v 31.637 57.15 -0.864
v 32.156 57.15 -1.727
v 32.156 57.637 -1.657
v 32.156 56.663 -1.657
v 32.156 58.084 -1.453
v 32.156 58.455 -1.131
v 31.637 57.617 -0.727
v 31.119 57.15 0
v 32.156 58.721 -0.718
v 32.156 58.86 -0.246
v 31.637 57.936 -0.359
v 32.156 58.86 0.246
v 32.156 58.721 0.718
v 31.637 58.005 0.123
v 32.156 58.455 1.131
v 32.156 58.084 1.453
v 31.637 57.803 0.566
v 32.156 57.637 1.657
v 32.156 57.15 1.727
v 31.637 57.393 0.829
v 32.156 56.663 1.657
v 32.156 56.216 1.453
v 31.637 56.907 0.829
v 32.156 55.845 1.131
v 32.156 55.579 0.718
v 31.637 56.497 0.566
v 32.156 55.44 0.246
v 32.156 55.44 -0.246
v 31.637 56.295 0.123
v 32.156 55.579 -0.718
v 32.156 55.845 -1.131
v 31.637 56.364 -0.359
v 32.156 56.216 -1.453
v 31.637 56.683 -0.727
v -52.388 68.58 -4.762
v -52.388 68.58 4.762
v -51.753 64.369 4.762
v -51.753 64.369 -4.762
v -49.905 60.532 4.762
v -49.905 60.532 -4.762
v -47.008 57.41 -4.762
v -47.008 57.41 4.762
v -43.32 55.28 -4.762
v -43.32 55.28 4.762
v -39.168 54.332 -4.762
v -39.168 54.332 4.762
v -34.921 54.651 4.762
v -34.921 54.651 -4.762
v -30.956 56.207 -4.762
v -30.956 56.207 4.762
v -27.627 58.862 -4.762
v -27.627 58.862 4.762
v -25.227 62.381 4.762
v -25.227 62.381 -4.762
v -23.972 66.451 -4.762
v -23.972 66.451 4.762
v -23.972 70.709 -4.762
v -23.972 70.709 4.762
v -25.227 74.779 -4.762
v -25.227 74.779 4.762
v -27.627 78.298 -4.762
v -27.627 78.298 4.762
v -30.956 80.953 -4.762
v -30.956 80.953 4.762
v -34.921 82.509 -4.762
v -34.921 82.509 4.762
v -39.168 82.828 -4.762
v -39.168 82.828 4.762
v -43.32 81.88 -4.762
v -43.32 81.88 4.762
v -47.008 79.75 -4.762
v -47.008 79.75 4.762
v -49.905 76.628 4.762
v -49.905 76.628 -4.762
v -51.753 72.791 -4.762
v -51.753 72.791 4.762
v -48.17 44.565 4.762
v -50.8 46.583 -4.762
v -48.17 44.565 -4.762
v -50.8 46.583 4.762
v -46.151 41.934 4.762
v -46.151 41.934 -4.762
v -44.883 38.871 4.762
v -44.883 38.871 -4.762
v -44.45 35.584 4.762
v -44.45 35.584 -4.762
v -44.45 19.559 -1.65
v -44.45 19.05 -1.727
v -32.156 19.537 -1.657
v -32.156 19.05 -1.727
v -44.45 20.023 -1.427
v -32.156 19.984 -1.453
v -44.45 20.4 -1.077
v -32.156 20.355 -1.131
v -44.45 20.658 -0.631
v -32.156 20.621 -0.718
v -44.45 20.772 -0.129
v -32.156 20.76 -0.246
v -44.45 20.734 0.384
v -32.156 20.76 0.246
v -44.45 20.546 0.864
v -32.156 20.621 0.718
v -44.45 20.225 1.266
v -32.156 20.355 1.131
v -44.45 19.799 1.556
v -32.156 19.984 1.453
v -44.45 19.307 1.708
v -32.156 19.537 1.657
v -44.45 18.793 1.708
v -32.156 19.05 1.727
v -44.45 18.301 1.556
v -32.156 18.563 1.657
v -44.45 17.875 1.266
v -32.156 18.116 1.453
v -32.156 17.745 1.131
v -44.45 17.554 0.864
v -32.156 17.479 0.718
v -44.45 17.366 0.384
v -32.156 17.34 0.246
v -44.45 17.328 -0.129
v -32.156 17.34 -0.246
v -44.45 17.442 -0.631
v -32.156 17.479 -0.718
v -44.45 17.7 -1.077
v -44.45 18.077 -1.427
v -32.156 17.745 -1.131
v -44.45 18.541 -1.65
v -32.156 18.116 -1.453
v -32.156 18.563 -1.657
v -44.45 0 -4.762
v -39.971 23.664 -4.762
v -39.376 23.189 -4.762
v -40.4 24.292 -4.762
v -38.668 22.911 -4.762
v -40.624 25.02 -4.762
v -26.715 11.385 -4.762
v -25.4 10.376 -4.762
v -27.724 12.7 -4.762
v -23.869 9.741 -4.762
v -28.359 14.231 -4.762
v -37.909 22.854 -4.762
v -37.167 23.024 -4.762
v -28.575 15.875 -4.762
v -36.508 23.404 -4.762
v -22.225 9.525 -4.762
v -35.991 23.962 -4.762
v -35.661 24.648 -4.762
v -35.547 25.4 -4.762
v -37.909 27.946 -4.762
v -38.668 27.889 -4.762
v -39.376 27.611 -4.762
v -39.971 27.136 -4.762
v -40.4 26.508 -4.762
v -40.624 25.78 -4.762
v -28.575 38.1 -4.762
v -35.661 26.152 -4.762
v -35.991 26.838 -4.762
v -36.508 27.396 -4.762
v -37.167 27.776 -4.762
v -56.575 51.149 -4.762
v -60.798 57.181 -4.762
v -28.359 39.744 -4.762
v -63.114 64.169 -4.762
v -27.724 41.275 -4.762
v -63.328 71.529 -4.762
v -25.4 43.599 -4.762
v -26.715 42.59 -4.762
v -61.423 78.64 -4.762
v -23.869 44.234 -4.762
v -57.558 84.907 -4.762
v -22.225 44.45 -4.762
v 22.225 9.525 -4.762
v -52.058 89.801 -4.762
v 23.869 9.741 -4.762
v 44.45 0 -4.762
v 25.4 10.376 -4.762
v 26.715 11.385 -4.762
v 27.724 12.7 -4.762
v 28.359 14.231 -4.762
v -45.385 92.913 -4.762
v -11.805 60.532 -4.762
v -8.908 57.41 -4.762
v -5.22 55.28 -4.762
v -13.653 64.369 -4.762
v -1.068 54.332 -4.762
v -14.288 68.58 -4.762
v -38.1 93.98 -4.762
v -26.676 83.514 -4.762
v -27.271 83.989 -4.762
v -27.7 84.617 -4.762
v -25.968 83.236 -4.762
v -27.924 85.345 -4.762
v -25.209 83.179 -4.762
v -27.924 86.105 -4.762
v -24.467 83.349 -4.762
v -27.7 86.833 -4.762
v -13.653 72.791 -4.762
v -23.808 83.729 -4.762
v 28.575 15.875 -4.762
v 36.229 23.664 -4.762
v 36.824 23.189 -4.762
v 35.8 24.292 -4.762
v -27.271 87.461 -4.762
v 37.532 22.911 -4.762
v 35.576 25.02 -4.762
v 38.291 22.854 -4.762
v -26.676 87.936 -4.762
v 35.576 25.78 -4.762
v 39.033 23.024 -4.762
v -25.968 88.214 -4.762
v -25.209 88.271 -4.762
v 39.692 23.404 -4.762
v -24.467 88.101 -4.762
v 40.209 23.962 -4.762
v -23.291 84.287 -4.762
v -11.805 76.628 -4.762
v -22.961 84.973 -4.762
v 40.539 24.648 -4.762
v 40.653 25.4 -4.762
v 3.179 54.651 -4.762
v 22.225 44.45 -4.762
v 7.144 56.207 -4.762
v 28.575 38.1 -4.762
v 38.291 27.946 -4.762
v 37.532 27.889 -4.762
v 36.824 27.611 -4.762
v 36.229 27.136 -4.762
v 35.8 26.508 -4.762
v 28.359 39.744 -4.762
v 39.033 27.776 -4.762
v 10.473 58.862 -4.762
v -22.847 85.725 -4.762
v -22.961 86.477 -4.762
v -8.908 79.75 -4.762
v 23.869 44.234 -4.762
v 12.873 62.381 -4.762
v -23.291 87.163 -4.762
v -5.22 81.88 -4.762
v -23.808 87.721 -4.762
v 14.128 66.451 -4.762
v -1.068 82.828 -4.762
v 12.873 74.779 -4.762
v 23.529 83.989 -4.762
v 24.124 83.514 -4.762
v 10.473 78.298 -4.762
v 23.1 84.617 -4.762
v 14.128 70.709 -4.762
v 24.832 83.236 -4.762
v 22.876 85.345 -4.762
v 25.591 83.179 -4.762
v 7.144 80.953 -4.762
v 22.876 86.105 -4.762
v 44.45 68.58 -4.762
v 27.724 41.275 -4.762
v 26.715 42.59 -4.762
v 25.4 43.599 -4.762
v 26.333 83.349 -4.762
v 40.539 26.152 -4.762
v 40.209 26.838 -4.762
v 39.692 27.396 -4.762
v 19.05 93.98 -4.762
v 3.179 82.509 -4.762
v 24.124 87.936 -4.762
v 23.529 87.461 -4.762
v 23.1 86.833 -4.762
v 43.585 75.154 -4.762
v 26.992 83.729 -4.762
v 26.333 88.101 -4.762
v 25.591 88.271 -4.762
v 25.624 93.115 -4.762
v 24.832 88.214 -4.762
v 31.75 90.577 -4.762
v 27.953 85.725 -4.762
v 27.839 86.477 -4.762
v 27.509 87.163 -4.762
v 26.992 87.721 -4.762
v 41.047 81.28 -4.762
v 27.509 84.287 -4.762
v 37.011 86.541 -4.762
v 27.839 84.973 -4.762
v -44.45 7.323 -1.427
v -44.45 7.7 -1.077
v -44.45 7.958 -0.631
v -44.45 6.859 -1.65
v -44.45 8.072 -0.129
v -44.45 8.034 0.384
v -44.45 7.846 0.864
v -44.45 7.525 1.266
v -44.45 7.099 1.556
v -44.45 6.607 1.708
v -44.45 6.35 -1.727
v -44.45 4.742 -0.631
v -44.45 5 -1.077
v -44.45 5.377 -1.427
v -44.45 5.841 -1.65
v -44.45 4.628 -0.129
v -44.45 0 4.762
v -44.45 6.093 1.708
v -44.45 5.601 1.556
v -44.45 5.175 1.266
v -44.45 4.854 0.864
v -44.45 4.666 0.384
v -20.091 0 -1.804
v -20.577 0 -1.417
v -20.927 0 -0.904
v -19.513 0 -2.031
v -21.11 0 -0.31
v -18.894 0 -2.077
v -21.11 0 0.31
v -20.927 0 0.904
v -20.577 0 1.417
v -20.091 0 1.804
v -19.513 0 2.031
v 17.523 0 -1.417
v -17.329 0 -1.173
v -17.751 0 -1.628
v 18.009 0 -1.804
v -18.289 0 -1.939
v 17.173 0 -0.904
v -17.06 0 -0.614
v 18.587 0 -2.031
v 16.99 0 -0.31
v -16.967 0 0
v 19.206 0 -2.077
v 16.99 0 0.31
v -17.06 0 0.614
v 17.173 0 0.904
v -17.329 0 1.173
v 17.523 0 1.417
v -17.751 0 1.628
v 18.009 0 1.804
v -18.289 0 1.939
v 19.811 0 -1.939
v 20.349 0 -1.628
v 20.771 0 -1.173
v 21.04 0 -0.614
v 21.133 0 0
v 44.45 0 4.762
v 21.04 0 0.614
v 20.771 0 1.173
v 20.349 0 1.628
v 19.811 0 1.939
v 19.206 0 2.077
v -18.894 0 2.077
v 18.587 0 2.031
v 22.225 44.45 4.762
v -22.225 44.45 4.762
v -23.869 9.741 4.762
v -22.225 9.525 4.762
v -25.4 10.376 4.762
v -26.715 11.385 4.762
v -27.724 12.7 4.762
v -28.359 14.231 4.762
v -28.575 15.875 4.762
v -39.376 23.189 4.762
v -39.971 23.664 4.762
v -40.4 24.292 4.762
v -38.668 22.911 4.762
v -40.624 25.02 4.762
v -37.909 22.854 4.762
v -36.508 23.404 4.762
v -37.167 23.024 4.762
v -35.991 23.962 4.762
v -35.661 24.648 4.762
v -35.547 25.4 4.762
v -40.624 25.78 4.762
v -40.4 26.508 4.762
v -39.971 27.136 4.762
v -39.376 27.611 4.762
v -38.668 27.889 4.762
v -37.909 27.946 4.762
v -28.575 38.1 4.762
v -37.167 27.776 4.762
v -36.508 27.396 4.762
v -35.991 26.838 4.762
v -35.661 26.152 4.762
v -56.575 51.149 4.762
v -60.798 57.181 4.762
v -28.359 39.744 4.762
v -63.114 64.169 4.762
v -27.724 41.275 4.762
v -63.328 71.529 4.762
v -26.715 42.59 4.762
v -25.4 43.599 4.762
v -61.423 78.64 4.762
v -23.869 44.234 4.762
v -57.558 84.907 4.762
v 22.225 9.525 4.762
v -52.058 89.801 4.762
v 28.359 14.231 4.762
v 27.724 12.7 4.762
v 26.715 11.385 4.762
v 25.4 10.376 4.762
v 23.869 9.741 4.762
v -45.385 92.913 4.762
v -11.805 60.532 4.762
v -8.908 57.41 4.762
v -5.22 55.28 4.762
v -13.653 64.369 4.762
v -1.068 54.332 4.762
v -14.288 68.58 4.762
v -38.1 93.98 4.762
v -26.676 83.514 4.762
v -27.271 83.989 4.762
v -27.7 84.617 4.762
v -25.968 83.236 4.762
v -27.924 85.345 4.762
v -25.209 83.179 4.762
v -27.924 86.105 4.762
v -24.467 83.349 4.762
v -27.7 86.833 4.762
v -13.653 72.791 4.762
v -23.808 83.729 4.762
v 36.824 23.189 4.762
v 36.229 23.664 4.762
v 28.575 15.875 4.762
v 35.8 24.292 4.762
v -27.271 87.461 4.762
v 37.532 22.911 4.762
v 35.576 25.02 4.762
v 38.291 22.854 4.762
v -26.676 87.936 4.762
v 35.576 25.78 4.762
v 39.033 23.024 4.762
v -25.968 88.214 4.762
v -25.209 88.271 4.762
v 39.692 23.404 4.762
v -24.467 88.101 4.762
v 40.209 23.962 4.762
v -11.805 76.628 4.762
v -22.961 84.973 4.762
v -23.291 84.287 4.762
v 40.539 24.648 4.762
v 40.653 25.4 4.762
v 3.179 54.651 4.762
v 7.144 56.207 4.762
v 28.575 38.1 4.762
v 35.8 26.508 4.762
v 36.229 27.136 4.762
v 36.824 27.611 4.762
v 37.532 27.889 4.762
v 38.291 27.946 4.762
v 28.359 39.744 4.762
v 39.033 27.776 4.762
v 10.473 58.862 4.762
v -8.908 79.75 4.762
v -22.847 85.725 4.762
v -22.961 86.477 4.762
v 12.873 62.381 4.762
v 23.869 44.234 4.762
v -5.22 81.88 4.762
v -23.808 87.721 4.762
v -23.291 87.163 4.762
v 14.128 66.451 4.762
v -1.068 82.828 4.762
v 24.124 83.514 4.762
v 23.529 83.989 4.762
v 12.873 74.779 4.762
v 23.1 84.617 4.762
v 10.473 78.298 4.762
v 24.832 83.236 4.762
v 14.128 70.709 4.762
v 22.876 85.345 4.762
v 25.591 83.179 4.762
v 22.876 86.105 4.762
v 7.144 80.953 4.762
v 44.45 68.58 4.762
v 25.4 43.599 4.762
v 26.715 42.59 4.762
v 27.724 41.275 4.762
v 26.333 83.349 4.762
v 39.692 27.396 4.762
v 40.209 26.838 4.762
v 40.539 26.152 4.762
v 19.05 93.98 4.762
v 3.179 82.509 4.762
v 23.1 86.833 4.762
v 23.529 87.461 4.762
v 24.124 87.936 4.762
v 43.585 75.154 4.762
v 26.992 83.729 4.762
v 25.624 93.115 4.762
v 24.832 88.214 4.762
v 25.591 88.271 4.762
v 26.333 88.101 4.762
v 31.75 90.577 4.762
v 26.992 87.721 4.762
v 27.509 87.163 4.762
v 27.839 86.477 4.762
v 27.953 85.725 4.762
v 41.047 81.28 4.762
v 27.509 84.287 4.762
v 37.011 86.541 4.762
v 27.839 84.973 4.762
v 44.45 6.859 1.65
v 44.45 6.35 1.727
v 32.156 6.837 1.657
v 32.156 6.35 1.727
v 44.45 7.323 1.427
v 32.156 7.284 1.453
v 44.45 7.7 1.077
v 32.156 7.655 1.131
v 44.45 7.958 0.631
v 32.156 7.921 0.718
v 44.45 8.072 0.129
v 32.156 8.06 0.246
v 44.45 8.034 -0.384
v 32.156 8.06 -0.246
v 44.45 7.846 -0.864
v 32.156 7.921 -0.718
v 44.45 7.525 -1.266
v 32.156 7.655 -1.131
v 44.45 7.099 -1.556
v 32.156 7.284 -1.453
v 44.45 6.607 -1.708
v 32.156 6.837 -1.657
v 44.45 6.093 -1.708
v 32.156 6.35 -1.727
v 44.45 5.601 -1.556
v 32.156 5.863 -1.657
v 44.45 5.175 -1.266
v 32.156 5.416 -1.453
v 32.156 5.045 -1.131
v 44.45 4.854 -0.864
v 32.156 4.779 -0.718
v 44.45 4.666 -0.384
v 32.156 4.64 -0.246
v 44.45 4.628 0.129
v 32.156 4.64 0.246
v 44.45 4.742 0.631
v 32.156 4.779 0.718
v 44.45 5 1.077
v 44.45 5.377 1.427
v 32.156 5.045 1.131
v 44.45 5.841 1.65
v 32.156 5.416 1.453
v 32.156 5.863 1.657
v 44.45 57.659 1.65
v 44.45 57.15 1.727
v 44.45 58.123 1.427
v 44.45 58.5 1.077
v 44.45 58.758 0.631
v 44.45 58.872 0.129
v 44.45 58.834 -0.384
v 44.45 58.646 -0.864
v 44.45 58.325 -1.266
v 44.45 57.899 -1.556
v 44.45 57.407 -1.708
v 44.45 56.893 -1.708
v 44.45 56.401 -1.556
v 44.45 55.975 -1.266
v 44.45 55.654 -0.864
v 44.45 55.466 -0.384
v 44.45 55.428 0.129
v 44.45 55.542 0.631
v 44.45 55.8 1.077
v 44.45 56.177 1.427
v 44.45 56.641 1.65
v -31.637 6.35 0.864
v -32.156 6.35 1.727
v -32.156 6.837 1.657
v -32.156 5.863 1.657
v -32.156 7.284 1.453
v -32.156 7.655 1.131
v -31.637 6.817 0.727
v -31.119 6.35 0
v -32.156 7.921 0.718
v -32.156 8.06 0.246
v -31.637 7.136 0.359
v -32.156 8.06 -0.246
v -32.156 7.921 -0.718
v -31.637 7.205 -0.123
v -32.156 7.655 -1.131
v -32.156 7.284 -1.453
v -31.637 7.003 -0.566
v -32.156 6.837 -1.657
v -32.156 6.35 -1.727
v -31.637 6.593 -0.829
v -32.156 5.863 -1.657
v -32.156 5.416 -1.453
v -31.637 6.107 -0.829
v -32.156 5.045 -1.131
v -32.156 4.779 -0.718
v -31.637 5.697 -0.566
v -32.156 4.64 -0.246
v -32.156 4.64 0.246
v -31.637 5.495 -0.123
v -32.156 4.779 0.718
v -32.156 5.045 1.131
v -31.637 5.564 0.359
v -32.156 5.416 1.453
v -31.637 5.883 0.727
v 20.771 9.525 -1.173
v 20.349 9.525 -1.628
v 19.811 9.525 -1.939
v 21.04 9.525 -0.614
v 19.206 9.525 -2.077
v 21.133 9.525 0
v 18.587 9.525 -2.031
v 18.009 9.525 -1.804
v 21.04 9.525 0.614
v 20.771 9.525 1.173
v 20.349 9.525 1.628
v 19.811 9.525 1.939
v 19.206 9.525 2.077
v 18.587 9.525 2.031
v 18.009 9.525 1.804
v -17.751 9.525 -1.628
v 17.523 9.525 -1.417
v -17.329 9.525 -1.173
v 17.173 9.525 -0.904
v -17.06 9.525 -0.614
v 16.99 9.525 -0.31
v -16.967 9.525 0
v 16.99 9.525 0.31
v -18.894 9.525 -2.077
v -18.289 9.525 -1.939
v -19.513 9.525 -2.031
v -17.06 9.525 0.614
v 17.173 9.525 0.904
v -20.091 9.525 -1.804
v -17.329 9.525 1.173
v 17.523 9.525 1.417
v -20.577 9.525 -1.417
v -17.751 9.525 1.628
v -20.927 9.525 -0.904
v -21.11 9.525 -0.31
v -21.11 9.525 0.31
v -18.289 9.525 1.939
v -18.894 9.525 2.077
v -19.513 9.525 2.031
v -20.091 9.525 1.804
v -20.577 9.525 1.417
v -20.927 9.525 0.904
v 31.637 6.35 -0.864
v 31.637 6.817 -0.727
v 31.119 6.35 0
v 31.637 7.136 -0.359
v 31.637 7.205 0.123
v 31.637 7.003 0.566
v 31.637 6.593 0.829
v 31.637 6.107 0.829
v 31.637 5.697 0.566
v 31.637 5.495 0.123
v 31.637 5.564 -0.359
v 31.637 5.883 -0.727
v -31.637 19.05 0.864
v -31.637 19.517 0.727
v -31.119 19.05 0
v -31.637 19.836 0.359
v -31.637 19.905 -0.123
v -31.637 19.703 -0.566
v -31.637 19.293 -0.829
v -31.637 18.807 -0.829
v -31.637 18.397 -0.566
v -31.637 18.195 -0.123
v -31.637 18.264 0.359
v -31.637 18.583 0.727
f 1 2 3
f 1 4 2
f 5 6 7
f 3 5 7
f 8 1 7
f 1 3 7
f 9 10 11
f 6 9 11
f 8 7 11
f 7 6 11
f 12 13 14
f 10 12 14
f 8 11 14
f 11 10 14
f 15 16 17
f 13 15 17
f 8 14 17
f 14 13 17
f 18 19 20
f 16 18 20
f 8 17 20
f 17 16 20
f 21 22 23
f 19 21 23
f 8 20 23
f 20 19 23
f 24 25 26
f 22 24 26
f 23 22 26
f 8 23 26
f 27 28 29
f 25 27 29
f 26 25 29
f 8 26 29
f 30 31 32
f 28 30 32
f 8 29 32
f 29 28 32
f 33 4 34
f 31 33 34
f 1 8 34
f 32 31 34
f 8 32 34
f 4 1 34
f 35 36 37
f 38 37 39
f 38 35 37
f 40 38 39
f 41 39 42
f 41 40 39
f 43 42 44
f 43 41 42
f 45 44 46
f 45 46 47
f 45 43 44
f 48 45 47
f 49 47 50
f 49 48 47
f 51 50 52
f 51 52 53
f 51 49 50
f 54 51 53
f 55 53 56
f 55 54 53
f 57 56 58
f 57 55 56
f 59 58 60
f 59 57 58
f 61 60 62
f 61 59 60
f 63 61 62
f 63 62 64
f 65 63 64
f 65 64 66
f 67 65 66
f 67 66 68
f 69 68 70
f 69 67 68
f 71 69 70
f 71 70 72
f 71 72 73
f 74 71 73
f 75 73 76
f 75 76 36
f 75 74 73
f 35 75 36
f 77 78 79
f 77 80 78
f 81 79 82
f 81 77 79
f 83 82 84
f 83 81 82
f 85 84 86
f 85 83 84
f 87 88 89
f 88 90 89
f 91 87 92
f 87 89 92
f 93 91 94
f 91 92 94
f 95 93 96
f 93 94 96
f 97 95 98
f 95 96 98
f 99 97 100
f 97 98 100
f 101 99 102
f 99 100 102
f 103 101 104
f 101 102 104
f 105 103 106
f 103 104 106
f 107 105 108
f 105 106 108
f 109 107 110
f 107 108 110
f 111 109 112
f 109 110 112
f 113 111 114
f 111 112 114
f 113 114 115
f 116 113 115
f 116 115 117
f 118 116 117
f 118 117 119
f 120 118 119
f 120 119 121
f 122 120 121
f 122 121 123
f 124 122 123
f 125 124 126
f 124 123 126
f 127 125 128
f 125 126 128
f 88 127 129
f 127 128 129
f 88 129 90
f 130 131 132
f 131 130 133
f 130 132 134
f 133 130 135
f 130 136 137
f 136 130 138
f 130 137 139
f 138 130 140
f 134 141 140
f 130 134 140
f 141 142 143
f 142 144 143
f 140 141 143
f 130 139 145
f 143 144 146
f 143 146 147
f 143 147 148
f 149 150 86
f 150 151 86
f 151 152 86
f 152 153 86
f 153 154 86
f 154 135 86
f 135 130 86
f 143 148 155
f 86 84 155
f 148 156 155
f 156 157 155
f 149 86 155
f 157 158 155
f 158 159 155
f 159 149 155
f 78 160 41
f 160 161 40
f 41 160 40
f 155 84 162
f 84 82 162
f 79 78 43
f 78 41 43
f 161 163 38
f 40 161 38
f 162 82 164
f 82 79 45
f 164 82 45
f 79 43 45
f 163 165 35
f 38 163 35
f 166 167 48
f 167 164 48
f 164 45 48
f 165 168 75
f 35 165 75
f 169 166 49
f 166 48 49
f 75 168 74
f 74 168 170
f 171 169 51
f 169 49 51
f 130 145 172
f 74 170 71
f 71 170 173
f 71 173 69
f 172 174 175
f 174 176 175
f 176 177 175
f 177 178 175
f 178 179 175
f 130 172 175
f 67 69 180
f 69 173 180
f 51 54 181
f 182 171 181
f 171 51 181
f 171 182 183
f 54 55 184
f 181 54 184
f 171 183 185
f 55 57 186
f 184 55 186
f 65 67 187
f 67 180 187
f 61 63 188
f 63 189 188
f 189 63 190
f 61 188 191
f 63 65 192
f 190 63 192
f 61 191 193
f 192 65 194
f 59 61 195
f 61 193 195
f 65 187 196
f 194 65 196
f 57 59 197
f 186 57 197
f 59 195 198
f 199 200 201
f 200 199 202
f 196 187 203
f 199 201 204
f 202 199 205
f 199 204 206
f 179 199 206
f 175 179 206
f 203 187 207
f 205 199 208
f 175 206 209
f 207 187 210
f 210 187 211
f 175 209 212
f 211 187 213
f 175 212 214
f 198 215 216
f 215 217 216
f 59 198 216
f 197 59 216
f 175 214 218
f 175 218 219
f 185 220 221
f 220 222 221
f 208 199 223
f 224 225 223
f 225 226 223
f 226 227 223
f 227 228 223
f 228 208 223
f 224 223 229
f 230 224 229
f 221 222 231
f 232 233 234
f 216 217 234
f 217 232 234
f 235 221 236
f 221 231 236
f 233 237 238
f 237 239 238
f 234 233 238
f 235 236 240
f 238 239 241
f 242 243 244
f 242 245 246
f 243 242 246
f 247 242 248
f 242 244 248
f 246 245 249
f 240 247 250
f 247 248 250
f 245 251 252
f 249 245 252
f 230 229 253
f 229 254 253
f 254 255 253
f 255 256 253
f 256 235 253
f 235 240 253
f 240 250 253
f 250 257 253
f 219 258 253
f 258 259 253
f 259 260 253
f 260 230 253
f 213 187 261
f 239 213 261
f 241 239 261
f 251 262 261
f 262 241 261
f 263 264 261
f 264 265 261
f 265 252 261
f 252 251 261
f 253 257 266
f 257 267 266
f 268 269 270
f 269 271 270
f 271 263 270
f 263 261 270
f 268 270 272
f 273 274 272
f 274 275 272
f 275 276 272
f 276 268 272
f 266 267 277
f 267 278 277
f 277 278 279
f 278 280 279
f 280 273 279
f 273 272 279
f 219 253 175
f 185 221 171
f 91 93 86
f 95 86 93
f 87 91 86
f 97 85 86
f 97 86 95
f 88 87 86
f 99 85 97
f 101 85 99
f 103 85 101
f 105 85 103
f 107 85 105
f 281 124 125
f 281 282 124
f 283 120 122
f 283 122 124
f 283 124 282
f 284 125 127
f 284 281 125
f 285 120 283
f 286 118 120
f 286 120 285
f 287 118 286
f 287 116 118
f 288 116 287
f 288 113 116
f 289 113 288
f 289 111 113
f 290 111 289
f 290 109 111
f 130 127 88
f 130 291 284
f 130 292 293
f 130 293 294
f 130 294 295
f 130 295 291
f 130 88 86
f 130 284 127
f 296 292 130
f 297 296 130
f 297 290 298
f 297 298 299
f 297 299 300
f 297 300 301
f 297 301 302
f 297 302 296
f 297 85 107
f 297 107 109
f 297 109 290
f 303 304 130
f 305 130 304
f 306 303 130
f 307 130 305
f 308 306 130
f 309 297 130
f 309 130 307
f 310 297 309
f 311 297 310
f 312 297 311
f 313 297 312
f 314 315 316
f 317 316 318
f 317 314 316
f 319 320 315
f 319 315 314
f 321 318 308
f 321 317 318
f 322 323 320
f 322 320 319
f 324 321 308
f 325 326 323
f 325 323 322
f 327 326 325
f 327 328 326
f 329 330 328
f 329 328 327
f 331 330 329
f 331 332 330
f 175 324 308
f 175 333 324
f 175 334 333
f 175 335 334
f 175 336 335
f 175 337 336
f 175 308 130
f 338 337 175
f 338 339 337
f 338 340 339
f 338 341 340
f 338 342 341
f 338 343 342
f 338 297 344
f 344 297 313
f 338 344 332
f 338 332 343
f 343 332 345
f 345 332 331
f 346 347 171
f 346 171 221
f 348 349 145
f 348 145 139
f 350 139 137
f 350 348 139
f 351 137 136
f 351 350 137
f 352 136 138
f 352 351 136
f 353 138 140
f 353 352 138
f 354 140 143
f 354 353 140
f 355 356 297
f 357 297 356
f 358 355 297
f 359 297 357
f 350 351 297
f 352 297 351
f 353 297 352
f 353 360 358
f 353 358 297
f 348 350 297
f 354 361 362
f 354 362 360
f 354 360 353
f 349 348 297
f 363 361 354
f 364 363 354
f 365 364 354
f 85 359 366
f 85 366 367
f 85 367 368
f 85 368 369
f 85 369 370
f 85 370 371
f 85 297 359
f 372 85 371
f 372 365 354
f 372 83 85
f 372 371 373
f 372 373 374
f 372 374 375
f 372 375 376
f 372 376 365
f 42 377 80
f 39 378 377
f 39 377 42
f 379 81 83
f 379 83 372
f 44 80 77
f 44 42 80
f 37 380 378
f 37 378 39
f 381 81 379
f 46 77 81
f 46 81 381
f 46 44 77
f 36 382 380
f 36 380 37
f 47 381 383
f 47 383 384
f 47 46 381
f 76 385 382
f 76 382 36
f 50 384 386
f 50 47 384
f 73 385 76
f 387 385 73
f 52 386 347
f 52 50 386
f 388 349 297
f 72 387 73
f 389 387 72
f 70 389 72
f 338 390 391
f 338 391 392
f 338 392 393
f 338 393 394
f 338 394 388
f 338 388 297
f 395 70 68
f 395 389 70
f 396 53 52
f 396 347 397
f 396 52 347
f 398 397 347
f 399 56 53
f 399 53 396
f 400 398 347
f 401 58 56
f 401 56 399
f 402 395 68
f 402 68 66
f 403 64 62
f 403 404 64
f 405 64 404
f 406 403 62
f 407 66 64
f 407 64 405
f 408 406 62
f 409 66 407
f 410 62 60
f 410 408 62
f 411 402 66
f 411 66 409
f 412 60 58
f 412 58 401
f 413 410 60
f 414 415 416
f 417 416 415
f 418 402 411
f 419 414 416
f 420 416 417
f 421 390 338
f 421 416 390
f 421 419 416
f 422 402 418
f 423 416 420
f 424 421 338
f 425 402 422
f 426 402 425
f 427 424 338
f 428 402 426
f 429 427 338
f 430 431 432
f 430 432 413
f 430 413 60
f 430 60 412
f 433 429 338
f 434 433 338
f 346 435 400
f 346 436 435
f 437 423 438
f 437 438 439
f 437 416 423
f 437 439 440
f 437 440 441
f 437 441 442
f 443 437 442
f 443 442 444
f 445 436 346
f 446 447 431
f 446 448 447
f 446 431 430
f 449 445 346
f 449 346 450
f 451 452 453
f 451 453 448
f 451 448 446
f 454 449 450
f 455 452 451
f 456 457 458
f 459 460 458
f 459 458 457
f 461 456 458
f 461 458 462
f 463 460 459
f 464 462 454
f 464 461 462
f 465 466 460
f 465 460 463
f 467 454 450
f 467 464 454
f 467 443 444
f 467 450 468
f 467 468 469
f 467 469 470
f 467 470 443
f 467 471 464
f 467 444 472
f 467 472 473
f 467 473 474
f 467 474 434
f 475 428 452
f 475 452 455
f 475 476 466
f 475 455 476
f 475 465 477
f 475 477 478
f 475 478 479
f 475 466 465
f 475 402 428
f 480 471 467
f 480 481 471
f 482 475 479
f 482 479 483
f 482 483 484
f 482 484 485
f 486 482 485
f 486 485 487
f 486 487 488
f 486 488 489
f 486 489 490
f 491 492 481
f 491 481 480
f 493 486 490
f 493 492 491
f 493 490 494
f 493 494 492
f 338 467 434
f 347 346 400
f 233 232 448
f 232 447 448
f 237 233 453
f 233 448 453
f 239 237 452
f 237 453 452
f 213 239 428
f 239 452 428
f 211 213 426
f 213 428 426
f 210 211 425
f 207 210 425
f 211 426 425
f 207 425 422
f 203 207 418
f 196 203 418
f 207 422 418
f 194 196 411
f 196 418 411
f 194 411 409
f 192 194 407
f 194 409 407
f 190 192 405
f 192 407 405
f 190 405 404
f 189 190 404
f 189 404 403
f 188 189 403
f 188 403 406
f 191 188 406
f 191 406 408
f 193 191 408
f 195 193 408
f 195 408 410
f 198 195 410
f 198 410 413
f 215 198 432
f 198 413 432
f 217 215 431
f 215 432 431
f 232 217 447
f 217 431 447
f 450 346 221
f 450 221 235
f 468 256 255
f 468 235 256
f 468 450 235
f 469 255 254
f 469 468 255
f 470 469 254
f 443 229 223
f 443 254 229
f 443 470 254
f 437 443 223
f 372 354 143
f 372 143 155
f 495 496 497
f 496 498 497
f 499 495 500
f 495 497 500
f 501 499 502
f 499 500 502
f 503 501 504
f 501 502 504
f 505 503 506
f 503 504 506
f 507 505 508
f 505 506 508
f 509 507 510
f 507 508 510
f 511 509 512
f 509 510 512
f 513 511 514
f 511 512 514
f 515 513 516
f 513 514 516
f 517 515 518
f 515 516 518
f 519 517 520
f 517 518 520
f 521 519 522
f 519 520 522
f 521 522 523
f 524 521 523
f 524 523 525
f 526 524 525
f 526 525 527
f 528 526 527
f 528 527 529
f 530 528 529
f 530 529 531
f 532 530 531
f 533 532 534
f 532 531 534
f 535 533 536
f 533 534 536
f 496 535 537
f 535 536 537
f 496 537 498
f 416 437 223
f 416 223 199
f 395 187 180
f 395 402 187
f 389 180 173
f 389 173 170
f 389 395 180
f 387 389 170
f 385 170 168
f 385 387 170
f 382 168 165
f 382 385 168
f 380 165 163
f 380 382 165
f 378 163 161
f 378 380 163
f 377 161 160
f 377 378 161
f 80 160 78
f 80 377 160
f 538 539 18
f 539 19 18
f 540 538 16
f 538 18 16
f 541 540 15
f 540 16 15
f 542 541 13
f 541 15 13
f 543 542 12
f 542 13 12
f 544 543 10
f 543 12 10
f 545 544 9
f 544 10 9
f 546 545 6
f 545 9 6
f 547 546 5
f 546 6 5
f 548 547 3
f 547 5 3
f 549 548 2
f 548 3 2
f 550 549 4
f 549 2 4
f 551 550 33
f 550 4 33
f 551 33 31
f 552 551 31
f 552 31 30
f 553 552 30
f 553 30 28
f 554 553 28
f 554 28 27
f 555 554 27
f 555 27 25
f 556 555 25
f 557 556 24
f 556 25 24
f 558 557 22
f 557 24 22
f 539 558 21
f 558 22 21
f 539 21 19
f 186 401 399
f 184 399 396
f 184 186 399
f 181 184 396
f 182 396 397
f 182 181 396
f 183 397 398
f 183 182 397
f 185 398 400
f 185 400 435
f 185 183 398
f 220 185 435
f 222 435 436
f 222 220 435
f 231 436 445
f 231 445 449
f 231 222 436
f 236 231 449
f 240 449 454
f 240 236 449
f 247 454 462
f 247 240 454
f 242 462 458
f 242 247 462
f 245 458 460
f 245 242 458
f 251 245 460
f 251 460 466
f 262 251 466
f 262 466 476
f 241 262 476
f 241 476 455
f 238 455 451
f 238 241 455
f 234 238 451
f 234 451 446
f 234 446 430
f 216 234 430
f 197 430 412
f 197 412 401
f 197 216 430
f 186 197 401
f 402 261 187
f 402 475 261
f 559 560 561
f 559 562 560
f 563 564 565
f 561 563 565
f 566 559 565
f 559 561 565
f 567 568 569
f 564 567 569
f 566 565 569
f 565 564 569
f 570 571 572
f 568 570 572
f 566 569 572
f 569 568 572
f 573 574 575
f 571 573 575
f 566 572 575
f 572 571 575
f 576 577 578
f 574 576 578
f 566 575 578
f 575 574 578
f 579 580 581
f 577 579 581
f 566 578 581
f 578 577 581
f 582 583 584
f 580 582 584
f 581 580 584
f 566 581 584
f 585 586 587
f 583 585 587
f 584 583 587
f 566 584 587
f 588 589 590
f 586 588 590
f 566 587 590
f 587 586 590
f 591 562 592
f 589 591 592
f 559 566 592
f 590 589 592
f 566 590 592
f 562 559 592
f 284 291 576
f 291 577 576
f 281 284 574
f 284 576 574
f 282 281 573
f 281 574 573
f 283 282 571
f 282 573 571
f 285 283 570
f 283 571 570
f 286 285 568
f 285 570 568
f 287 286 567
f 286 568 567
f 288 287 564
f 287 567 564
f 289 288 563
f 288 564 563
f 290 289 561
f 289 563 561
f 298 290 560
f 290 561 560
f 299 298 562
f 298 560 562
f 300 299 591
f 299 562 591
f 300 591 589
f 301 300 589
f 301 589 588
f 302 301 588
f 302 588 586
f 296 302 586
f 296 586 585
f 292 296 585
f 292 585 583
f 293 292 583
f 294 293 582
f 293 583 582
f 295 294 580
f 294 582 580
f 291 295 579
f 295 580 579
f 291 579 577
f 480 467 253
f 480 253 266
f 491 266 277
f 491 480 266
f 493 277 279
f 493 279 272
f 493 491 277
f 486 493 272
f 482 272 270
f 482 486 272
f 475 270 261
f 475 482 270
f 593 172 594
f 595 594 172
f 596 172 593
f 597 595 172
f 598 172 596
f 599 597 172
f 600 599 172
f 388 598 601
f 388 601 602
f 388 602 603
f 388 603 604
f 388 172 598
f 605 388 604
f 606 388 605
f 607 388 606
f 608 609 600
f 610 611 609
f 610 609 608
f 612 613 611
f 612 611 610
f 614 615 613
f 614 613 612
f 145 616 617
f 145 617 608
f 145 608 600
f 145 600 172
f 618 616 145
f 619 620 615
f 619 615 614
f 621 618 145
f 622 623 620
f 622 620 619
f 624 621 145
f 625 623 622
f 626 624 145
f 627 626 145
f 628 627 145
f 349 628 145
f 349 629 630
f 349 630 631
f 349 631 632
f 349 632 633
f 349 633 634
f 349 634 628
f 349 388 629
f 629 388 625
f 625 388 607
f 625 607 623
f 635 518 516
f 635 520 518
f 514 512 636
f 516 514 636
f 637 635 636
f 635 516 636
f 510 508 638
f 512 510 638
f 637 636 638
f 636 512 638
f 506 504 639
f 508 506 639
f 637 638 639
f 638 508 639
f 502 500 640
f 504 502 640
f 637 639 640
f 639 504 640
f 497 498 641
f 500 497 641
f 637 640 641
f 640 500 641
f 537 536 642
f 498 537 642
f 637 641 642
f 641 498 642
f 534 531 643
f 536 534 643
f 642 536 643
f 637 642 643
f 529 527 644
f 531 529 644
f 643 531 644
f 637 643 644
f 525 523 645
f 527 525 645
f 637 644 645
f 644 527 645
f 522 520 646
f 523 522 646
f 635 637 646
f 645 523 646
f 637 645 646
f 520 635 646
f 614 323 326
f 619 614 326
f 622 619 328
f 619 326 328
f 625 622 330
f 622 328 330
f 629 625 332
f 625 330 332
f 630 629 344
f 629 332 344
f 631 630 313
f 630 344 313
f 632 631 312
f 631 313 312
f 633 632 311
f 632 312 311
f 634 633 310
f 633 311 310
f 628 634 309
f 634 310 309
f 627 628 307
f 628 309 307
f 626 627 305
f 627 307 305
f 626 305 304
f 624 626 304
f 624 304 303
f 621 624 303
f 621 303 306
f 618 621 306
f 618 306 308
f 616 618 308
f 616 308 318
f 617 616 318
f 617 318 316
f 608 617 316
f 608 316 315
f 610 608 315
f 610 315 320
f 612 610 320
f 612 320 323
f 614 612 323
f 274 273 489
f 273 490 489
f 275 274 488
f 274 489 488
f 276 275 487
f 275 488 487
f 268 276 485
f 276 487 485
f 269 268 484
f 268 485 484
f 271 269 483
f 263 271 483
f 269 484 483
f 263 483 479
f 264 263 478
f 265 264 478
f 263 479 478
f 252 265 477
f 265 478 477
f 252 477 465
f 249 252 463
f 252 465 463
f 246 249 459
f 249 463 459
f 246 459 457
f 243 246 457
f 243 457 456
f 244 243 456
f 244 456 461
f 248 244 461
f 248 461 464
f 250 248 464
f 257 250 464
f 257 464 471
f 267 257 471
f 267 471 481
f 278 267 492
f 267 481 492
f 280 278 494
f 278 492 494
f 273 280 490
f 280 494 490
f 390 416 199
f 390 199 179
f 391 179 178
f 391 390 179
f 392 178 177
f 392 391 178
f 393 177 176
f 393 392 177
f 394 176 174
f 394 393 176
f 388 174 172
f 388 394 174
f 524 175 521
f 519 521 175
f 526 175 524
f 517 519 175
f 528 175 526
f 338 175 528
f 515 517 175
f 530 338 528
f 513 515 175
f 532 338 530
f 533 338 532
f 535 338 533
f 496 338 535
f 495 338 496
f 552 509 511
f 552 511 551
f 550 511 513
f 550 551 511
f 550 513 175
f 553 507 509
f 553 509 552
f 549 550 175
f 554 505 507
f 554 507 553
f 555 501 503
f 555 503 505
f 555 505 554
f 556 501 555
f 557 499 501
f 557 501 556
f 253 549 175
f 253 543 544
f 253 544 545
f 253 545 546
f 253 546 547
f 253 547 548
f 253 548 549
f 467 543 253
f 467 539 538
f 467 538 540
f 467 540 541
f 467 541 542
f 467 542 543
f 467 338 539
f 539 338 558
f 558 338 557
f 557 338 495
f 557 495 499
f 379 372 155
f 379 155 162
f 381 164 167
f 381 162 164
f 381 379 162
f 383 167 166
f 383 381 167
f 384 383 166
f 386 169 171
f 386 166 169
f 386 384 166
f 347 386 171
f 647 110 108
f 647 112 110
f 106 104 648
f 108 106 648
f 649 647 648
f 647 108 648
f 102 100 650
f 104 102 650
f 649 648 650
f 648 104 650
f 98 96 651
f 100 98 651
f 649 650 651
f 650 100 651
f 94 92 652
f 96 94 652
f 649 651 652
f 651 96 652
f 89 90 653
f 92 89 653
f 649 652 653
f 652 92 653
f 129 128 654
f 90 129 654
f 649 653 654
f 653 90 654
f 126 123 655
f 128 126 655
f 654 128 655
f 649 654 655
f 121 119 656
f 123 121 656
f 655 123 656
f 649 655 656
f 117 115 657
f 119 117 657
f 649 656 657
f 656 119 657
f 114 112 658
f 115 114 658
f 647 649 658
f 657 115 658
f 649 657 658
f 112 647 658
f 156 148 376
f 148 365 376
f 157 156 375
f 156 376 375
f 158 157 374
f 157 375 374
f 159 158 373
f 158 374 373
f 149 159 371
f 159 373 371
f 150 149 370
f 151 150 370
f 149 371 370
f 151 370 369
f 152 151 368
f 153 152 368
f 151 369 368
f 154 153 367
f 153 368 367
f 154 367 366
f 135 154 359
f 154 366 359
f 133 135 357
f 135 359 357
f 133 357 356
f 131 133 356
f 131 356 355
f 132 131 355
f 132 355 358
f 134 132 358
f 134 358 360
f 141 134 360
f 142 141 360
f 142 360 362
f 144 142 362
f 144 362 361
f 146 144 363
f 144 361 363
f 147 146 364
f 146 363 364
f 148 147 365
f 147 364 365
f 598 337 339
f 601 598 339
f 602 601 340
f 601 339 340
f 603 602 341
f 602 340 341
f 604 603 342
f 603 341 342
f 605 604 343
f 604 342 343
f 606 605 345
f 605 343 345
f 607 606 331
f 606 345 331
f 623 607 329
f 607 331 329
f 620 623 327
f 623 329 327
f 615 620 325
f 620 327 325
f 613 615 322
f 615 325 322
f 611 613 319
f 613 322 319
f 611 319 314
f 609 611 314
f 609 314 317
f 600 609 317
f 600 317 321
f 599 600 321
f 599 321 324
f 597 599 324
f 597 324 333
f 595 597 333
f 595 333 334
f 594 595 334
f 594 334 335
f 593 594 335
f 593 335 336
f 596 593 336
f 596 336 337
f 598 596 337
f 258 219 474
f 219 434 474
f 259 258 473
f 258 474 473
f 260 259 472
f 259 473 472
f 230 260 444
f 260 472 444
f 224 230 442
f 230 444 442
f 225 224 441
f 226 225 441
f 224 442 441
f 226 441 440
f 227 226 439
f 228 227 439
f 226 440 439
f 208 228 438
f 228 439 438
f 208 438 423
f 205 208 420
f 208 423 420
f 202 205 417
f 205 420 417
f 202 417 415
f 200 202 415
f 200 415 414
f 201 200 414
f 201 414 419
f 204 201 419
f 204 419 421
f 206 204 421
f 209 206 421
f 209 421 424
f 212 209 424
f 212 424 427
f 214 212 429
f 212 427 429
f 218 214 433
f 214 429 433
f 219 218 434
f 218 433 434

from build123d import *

# Parameters (mm, degrees)
SKETCH1_R                       = 14.2875
BOSS_EXTRUDE1_DEPTH             = 4.7625
F_8_32_TAPPED_HOLE1_D           = 3.4544
F_8_32_TAPPED_HOLE1_DEPTH       = 19.05
F_8_32_TAPPED_HOLE1_CBORE_D     = 4.1656
F_8_32_TAPPED_HOLE1_CBORE_DEPTH = 15.875
F_8_32_TAPPED_HOLE1_TIP         = 1.037806461
F_8_32_TAPPED_HOLE2_D           = 3.4544
F_8_32_TAPPED_HOLE2_DEPTH       = 12.2936
F_8_32_TAPPED_HOLE2_TIP         = 1.037806461
CUT_EXTRUDE2_DEPTH              = 114.820982358
F_8_32_TAPPED_HOLE3_D           = 3.4544
F_8_32_TAPPED_HOLE3_DEPTH       = 12.2936
F_8_32_TAPPED_HOLE3_TIP         = 1.037806461
F_10_CLEARANCE_HOLE1_D          = 5.1054
F_10_CLEARANCE_HOLE1_DEPTH      = 9.525
F_10_CLEARANCE_HOLE1_TIP        = 1.533816902


with BuildPart() as part:
    # Sketch1 → Boss-Extrude1 (new, symmetric)
    with BuildSketch(Plane.XY):
        with BuildLine():
            Line((-44.45, 35.584432116), (-44.45, 0))
            Line((-44.45, 0), (44.45, 0))
            Line((44.45, 0), (44.45, 68.58))
            ThreePointArc((44.45, 68.58), (37.010512242, 86.540512242), (19.05, 93.98))
            Line((19.05, 93.98), (-38.1, 93.98))
            ThreePointArc((-38.1, 93.98), (-62.634515988, 75.154003746), (-50.8, 46.582954744))
            ThreePointArc((-50.8, 46.582954744), (-46.151477372, 41.934432116), (-44.45, 35.584432116))
        make_face()
        with Locations(Location((0, 68.58, 0), (0, 0, 180))):
            Circle(SKETCH1_R, mode=Mode.SUBTRACT)
        with Locations(Location((-38.1, 68.58, 0), (0, 0, 180))):
            Circle(SKETCH1_R, mode=Mode.SUBTRACT)
    extrude(amount=BOSS_EXTRUDE1_DEPTH, both=True)

    # #8-32 Tapped Hole1
    with Locations(Plane.XZ):
        with Locations((-19.05, 0), (19.05, 0)):
            CounterBoreHole(F_8_32_TAPPED_HOLE1_D / 2, F_8_32_TAPPED_HOLE1_CBORE_D / 2, F_8_32_TAPPED_HOLE1_CBORE_DEPTH, depth=F_8_32_TAPPED_HOLE1_DEPTH)
            with Locations((0, 0, -(F_8_32_TAPPED_HOLE1_DEPTH + F_8_32_TAPPED_HOLE1_TIP / 2))):  # 118° drill point
                Cone(0, F_8_32_TAPPED_HOLE1_D / 2, F_8_32_TAPPED_HOLE1_TIP, mode=Mode.SUBTRACT)

    # #8-32 Tapped Hole2
    with Locations(Plane(origin=(-44.45, 3.933791499, -1.696886329), x_dir=(0, 0, 1), z_dir=(-1, 0, 0))):
        with Locations((1.696886329, 15.116208501), (1.696886329, 2.416208501)):
            Hole(F_8_32_TAPPED_HOLE2_D / 2, depth=F_8_32_TAPPED_HOLE2_DEPTH)
            with Locations((0, 0, -(F_8_32_TAPPED_HOLE2_DEPTH + F_8_32_TAPPED_HOLE2_TIP / 2))):  # 118° drill point
                Cone(0, F_8_32_TAPPED_HOLE2_D / 2, F_8_32_TAPPED_HOLE2_TIP, mode=Mode.SUBTRACT)

    # Sketch7 → Cut-Extrude2 (cut, through all)
    with BuildSketch(Plane.XY.offset(4.7625)):
        with BuildLine():
            Line((-22.225, 44.45), (22.225, 44.45))
            ThreePointArc((22.225, 44.45), (26.715128061, 42.590128061), (28.575, 38.1))
            Line((28.575, 38.1), (28.575, 15.875))
            ThreePointArc((28.575, 15.875), (26.715128061, 11.384871939), (22.225, 9.525))
            Line((22.225, 9.525), (-22.225, 9.525))
            ThreePointArc((-22.225, 9.525), (-26.715128061, 11.384871939), (-28.575, 15.875))
            Line((-28.575, 15.875), (-28.575, 38.1))
            ThreePointArc((-28.575, 38.1), (-26.715128061, 42.590128061), (-22.225, 44.45))
        make_face()
    extrude(amount=-CUT_EXTRUDE2_DEPTH, mode=Mode.SUBTRACT)

    # #8-32 Tapped Hole3
    with Locations(Plane(origin=(44.45, 0, 0), x_dir=(0, 0, -1), z_dir=(1, 0, 0))):
        with Locations((0, 6.35), (0, 57.15)):
            Hole(F_8_32_TAPPED_HOLE3_D / 2, depth=F_8_32_TAPPED_HOLE3_DEPTH)
            with Locations((0, 0, -(F_8_32_TAPPED_HOLE3_DEPTH + F_8_32_TAPPED_HOLE3_TIP / 2))):  # 118° drill point
                Cone(0, F_8_32_TAPPED_HOLE3_D / 2, F_8_32_TAPPED_HOLE3_TIP, mode=Mode.SUBTRACT)

    # #10 Clearance Hole1
    with Locations(Plane(origin=(0, 0, -4.7625), x_dir=(-1, 0, 0), z_dir=(0, 0, -1))):
        with Locations((-25.4, 85.725), (25.4, 85.725), (38.1, 25.4), (-38.1, 25.4)):
            Hole(F_10_CLEARANCE_HOLE1_D / 2, depth=F_10_CLEARANCE_HOLE1_DEPTH)
            with Locations((0, 0, -(F_10_CLEARANCE_HOLE1_DEPTH + F_10_CLEARANCE_HOLE1_TIP / 2))):  # 118° drill point
                Cone(0, F_10_CLEARANCE_HOLE1_D / 2, F_10_CLEARANCE_HOLE1_TIP, mode=Mode.SUBTRACT)


solid = part.part
